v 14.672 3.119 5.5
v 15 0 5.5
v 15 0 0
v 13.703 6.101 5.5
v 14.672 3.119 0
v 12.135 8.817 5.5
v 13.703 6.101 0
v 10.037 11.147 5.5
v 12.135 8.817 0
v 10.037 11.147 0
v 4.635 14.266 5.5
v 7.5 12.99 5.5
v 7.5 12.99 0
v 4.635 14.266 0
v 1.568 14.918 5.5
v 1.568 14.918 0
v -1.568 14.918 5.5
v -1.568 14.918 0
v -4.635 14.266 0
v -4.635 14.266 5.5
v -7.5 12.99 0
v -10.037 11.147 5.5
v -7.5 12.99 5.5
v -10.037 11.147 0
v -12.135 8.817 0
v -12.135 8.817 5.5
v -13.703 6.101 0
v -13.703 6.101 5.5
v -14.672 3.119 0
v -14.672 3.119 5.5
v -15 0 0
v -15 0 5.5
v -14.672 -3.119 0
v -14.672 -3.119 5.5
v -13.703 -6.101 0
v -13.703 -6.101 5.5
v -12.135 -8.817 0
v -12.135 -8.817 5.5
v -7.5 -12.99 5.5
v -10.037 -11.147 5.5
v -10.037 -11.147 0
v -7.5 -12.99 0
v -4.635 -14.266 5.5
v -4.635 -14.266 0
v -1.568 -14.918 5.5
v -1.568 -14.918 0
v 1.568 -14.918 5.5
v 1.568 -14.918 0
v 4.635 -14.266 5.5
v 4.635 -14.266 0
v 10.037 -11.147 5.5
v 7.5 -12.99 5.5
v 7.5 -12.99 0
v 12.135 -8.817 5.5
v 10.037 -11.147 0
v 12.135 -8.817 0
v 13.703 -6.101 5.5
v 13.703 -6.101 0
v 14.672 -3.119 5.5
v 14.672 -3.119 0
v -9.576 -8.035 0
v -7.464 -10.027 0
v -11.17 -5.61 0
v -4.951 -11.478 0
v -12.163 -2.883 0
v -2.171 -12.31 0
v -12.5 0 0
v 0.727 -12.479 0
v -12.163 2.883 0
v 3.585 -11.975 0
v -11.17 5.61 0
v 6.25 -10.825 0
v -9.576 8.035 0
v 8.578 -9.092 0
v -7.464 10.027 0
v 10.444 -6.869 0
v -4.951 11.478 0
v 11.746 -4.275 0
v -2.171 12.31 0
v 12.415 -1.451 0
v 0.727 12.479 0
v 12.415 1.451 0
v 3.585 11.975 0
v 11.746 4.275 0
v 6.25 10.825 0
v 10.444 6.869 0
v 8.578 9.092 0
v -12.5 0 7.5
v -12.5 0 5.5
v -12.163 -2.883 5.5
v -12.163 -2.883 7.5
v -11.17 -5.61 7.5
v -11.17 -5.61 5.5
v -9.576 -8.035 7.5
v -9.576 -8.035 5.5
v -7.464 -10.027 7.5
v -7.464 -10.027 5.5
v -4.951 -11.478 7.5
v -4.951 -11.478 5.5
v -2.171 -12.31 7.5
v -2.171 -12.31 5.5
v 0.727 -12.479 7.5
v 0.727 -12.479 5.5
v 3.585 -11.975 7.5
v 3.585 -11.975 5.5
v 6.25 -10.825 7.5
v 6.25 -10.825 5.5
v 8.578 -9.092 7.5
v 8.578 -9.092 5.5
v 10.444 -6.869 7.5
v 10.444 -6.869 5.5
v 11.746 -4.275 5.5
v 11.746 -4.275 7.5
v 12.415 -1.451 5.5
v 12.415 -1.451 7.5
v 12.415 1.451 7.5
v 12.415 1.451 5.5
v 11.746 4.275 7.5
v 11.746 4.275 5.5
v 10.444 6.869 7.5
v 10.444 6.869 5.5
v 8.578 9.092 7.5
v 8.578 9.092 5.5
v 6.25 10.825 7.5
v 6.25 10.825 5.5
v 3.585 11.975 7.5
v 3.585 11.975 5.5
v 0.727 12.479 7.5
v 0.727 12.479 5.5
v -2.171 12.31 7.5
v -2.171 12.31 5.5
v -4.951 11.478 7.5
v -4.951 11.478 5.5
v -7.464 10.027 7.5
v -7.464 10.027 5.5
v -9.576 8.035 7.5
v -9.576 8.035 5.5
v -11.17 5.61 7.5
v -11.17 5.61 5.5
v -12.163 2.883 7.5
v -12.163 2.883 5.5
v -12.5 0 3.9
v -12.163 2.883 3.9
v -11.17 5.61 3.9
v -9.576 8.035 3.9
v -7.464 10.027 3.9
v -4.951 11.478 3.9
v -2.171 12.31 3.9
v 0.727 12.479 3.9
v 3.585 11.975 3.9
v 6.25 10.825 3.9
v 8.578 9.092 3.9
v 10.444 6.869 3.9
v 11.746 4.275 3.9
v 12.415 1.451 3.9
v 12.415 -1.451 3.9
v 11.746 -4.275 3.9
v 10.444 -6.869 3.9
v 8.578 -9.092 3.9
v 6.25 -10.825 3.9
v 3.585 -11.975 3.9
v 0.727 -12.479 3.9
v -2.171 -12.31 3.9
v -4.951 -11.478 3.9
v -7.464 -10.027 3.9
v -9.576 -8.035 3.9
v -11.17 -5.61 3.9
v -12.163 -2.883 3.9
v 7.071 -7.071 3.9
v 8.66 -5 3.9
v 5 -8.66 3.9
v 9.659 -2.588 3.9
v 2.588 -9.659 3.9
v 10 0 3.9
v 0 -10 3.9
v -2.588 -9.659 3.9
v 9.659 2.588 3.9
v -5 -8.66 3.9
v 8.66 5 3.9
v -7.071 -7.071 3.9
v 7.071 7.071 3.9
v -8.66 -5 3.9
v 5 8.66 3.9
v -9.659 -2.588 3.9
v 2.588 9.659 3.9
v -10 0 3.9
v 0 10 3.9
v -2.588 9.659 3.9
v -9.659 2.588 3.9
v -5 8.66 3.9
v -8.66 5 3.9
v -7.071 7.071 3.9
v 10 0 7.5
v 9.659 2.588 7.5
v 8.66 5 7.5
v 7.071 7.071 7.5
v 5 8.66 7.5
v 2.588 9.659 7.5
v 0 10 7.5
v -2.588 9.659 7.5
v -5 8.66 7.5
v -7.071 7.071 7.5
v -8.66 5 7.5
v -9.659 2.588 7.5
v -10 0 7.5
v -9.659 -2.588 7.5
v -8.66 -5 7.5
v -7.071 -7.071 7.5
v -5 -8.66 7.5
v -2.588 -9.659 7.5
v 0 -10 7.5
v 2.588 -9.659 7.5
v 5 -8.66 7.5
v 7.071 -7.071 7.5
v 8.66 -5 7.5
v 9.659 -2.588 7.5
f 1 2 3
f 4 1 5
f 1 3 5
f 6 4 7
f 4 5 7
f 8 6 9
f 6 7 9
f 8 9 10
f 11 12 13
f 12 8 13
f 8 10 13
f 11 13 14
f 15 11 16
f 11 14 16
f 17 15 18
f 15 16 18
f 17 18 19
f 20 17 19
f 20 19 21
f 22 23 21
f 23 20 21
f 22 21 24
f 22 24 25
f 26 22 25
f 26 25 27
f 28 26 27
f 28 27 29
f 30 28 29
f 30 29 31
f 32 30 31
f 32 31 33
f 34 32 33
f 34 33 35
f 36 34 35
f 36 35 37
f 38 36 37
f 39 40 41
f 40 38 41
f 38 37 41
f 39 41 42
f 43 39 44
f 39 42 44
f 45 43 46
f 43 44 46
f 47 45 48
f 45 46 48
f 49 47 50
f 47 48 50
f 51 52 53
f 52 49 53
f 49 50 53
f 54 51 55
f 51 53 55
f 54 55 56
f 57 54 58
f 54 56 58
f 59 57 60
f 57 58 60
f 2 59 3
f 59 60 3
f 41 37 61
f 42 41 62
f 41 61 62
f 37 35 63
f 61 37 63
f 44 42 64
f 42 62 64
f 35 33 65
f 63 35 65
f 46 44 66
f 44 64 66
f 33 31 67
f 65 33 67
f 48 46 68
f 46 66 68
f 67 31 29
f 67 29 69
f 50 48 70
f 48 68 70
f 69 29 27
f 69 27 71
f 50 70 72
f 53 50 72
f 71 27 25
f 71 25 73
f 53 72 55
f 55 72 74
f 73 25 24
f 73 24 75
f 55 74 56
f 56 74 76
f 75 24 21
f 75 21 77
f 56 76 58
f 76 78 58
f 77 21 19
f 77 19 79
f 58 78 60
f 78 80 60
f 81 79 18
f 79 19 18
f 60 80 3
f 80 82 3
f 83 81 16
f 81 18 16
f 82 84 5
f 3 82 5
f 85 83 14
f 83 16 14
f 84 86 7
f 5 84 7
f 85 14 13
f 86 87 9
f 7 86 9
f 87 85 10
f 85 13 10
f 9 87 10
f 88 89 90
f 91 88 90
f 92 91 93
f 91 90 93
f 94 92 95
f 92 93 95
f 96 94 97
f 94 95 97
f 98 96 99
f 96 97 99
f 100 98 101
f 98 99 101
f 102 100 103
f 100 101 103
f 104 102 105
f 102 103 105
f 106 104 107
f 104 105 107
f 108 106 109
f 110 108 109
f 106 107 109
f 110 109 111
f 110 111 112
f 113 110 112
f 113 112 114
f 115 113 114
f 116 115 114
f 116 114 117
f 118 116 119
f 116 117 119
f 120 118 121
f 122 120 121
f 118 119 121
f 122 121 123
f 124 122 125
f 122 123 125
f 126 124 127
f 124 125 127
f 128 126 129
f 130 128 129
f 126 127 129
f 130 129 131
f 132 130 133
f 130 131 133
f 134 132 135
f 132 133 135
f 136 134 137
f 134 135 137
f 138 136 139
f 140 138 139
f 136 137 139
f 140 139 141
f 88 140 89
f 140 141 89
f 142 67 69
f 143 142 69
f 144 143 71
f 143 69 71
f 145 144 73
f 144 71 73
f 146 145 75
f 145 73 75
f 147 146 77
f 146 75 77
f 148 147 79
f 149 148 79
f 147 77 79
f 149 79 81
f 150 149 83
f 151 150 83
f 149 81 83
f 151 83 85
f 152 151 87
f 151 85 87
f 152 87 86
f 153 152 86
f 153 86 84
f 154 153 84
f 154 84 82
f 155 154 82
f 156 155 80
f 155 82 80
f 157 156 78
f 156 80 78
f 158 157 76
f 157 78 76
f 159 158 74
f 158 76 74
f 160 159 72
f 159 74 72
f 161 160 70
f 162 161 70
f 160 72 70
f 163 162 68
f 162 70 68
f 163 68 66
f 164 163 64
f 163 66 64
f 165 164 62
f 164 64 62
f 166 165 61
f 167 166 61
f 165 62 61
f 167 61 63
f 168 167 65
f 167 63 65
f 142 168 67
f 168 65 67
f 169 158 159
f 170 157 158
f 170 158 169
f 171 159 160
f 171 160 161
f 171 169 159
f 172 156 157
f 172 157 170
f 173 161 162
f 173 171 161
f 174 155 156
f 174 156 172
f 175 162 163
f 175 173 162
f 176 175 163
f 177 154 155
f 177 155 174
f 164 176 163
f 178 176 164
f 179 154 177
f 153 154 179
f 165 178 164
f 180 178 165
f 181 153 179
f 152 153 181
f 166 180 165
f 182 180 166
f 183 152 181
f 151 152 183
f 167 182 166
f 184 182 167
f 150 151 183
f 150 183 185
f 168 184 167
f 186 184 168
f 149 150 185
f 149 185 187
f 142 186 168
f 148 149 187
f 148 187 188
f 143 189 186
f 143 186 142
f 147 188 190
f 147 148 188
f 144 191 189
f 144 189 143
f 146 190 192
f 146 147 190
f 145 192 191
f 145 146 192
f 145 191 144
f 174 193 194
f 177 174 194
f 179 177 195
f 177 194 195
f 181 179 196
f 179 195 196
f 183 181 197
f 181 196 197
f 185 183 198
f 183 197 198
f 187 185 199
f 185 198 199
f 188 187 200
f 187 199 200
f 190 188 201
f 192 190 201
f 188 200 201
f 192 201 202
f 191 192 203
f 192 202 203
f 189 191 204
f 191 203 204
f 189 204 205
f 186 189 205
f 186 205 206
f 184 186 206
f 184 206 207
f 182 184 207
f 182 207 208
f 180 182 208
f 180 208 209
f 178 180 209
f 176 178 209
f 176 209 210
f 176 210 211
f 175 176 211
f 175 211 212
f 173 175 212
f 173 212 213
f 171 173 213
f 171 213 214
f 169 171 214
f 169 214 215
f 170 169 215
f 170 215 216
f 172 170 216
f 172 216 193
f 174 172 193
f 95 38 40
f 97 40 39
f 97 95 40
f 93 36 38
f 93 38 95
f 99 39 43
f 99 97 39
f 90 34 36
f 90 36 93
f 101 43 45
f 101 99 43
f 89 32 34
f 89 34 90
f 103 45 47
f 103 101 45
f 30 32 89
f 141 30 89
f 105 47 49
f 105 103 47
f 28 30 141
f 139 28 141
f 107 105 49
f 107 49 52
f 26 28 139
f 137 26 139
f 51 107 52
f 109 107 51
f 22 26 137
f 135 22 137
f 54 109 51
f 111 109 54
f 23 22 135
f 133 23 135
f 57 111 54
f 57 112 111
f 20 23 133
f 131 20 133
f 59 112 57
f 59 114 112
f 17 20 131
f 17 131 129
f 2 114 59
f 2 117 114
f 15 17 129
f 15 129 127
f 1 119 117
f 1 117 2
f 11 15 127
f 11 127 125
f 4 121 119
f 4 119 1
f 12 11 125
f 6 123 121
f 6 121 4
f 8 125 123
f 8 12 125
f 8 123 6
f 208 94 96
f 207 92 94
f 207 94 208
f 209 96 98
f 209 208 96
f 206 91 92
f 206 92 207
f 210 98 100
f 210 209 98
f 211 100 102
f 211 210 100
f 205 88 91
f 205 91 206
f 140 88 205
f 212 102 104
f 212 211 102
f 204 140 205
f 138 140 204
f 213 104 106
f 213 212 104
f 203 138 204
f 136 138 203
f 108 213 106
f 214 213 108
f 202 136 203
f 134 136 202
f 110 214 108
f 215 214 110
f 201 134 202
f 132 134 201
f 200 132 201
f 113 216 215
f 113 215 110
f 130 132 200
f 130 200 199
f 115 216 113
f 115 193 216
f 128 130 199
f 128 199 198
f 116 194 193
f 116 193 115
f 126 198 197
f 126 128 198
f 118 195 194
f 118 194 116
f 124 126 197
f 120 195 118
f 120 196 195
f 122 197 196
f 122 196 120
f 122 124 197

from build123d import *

# Parameters (mm, degrees)
ESQUISSE1_R             = 15
BOSS_EXTRU_1_DEPTH      = 7.5
ESQUISSE3_R             = 12.5
ENL_V_MAT_EXTRU_1_DEPTH = 3.9
ENL_V_START             = -2
ESQUISSE4_R             = 15.5
ESQUISSE4_R_2           = 12.5
ENL_V_MAT_EXTRU_2_DEPTH = 2
ESQUISSE5_R             = 10
ENL_V_MAT_EXTRU_4_DEPTH = 5


with BuildPart() as part:
    # Esquisse1 → Boss.-Extru.1 (new body)
    with BuildSketch(Plane.XY):
        Circle(ESQUISSE1_R)
    extrude(amount=BOSS_EXTRU_1_DEPTH)

    # Esquisse3 → Enlèv. mat.-Extru.1 (cut)
    with BuildSketch(Plane(origin=(0, 0, 0), x_dir=(-1, 0, 0), z_dir=(0, 0, -1))):
        Circle(ESQUISSE3_R)
    extrude(amount=-ENL_V_MAT_EXTRU_1_DEPTH, mode=Mode.SUBTRACT)

    # Esquisse4 → Enlèv. mat.-Extru.2 (cut)
    with BuildSketch(Plane.XY.offset(7.5).offset(ENL_V_START)):
        Circle(ESQUISSE4_R)
        with Locations(Location((0, 0, 0), (0, 0, 180))):
            Circle(ESQUISSE4_R_2, mode=Mode.SUBTRACT)
    extrude(amount=ENL_V_MAT_EXTRU_2_DEPTH, mode=Mode.SUBTRACT)

    # Esquisse5 → Enlèv. mat.-Extru.4 (cut)
    with BuildSketch(Plane.XY.offset(7.5)):
        Circle(ESQUISSE5_R)
    extrude(amount=-ENL_V_MAT_EXTRU_4_DEPTH, mode=Mode.SUBTRACT)


solid = part.part
